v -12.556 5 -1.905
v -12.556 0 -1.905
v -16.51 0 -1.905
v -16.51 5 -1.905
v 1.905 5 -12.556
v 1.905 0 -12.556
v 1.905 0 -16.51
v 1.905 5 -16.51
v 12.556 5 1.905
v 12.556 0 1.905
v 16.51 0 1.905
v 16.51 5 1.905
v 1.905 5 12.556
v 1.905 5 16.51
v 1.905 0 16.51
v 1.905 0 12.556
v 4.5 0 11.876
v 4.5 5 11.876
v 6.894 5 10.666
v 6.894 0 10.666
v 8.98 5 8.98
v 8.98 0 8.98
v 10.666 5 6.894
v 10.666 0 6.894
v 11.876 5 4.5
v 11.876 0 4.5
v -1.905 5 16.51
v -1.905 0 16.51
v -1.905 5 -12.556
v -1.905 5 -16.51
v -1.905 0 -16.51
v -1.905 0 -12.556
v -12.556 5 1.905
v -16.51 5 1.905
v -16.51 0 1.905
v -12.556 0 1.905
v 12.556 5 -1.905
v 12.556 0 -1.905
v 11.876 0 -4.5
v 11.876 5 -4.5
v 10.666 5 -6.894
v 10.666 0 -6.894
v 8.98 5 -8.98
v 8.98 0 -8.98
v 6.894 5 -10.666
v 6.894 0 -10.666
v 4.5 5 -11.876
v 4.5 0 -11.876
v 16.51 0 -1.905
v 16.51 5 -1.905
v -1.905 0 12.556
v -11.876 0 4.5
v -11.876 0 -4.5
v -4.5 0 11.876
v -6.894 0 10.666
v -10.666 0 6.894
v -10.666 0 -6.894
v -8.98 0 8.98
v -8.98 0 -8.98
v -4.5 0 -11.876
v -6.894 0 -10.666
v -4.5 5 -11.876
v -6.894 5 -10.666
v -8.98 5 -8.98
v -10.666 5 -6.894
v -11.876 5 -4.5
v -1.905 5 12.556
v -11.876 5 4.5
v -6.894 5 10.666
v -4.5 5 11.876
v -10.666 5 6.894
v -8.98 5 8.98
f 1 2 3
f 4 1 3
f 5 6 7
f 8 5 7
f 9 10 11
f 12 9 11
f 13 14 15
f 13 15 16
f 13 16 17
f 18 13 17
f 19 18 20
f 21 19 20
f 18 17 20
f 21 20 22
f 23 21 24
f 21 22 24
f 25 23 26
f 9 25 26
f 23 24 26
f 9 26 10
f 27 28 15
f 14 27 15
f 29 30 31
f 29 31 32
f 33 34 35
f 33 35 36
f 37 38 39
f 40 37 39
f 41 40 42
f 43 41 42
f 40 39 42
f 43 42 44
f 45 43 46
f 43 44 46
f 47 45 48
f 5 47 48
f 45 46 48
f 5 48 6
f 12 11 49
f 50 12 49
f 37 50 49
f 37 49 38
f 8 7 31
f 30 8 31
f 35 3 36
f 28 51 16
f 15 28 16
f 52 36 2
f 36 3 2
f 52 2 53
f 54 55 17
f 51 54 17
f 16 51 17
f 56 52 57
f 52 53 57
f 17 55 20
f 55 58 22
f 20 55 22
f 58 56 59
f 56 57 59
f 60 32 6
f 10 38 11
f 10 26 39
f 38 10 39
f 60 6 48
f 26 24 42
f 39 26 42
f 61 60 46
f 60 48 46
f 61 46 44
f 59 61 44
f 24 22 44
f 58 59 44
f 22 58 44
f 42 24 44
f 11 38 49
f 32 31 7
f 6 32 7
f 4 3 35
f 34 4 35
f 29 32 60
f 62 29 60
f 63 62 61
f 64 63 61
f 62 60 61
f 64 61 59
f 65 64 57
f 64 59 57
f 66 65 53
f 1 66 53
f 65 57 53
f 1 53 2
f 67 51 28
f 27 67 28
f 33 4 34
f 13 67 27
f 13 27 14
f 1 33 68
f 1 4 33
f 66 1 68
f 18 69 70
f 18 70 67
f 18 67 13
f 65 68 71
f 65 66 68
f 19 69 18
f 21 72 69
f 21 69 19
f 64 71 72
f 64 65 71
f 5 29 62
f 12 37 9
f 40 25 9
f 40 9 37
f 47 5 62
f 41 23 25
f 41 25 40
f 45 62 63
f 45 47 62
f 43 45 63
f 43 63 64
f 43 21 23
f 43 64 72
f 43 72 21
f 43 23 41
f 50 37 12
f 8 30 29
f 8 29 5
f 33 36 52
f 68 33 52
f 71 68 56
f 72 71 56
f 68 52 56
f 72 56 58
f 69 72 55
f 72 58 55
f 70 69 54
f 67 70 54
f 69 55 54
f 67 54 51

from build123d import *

# Parameters (mm, degrees)
BOSS_EXTRUDE1_DEPTH = 5


with BuildPart() as part:
    # Sketch1 → Boss-Extrude1 (new body)
    with BuildSketch(Plane(origin=(0, 0, 0), x_dir=(1, 0, 0), z_dir=(0, 1, 0))):
        with BuildLine():
            Line((16.51, -1.905), (16.51, 1.905))
            Line((16.51, 1.905), (12.556312158, 1.905))
            ThreePointArc((12.556312158, 1.905), (8.980256121, 8.980256121), (1.905, 12.556312158))
            Line((1.905, 12.556312158), (1.905, 16.51))
            Line((1.905, 16.51), (-1.905, 16.51))
            Line((-1.905, 16.51), (-1.905, 12.556312158))
            ThreePointArc((-1.905, 12.556312158), (-8.980256121, 8.980256121), (-12.556312158, 1.905))
            Line((-12.556312158, 1.905), (-16.51, 1.905))
            Line((-16.51, 1.905), (-16.51, -1.905))
            Line((-16.51, -1.905), (-12.556312158, -1.905))
            ThreePointArc((-12.556312158, -1.905), (-8.980256121, -8.980256121), (-1.905, -12.556312158))
            Line((-1.905, -12.556312158), (-1.905, -16.51))
            Line((-1.905, -16.51), (1.905, -16.51))
            Line((1.905, -16.51), (1.905, -12.556312158))
            ThreePointArc((1.905, -12.556312158), (8.980256121, -8.980256121), (12.556312158, -1.905))
            Line((12.556312158, -1.905), (16.51, -1.905))
        make_face()
    extrude(amount=BOSS_EXTRUDE1_DEPTH)


solid = part.part
